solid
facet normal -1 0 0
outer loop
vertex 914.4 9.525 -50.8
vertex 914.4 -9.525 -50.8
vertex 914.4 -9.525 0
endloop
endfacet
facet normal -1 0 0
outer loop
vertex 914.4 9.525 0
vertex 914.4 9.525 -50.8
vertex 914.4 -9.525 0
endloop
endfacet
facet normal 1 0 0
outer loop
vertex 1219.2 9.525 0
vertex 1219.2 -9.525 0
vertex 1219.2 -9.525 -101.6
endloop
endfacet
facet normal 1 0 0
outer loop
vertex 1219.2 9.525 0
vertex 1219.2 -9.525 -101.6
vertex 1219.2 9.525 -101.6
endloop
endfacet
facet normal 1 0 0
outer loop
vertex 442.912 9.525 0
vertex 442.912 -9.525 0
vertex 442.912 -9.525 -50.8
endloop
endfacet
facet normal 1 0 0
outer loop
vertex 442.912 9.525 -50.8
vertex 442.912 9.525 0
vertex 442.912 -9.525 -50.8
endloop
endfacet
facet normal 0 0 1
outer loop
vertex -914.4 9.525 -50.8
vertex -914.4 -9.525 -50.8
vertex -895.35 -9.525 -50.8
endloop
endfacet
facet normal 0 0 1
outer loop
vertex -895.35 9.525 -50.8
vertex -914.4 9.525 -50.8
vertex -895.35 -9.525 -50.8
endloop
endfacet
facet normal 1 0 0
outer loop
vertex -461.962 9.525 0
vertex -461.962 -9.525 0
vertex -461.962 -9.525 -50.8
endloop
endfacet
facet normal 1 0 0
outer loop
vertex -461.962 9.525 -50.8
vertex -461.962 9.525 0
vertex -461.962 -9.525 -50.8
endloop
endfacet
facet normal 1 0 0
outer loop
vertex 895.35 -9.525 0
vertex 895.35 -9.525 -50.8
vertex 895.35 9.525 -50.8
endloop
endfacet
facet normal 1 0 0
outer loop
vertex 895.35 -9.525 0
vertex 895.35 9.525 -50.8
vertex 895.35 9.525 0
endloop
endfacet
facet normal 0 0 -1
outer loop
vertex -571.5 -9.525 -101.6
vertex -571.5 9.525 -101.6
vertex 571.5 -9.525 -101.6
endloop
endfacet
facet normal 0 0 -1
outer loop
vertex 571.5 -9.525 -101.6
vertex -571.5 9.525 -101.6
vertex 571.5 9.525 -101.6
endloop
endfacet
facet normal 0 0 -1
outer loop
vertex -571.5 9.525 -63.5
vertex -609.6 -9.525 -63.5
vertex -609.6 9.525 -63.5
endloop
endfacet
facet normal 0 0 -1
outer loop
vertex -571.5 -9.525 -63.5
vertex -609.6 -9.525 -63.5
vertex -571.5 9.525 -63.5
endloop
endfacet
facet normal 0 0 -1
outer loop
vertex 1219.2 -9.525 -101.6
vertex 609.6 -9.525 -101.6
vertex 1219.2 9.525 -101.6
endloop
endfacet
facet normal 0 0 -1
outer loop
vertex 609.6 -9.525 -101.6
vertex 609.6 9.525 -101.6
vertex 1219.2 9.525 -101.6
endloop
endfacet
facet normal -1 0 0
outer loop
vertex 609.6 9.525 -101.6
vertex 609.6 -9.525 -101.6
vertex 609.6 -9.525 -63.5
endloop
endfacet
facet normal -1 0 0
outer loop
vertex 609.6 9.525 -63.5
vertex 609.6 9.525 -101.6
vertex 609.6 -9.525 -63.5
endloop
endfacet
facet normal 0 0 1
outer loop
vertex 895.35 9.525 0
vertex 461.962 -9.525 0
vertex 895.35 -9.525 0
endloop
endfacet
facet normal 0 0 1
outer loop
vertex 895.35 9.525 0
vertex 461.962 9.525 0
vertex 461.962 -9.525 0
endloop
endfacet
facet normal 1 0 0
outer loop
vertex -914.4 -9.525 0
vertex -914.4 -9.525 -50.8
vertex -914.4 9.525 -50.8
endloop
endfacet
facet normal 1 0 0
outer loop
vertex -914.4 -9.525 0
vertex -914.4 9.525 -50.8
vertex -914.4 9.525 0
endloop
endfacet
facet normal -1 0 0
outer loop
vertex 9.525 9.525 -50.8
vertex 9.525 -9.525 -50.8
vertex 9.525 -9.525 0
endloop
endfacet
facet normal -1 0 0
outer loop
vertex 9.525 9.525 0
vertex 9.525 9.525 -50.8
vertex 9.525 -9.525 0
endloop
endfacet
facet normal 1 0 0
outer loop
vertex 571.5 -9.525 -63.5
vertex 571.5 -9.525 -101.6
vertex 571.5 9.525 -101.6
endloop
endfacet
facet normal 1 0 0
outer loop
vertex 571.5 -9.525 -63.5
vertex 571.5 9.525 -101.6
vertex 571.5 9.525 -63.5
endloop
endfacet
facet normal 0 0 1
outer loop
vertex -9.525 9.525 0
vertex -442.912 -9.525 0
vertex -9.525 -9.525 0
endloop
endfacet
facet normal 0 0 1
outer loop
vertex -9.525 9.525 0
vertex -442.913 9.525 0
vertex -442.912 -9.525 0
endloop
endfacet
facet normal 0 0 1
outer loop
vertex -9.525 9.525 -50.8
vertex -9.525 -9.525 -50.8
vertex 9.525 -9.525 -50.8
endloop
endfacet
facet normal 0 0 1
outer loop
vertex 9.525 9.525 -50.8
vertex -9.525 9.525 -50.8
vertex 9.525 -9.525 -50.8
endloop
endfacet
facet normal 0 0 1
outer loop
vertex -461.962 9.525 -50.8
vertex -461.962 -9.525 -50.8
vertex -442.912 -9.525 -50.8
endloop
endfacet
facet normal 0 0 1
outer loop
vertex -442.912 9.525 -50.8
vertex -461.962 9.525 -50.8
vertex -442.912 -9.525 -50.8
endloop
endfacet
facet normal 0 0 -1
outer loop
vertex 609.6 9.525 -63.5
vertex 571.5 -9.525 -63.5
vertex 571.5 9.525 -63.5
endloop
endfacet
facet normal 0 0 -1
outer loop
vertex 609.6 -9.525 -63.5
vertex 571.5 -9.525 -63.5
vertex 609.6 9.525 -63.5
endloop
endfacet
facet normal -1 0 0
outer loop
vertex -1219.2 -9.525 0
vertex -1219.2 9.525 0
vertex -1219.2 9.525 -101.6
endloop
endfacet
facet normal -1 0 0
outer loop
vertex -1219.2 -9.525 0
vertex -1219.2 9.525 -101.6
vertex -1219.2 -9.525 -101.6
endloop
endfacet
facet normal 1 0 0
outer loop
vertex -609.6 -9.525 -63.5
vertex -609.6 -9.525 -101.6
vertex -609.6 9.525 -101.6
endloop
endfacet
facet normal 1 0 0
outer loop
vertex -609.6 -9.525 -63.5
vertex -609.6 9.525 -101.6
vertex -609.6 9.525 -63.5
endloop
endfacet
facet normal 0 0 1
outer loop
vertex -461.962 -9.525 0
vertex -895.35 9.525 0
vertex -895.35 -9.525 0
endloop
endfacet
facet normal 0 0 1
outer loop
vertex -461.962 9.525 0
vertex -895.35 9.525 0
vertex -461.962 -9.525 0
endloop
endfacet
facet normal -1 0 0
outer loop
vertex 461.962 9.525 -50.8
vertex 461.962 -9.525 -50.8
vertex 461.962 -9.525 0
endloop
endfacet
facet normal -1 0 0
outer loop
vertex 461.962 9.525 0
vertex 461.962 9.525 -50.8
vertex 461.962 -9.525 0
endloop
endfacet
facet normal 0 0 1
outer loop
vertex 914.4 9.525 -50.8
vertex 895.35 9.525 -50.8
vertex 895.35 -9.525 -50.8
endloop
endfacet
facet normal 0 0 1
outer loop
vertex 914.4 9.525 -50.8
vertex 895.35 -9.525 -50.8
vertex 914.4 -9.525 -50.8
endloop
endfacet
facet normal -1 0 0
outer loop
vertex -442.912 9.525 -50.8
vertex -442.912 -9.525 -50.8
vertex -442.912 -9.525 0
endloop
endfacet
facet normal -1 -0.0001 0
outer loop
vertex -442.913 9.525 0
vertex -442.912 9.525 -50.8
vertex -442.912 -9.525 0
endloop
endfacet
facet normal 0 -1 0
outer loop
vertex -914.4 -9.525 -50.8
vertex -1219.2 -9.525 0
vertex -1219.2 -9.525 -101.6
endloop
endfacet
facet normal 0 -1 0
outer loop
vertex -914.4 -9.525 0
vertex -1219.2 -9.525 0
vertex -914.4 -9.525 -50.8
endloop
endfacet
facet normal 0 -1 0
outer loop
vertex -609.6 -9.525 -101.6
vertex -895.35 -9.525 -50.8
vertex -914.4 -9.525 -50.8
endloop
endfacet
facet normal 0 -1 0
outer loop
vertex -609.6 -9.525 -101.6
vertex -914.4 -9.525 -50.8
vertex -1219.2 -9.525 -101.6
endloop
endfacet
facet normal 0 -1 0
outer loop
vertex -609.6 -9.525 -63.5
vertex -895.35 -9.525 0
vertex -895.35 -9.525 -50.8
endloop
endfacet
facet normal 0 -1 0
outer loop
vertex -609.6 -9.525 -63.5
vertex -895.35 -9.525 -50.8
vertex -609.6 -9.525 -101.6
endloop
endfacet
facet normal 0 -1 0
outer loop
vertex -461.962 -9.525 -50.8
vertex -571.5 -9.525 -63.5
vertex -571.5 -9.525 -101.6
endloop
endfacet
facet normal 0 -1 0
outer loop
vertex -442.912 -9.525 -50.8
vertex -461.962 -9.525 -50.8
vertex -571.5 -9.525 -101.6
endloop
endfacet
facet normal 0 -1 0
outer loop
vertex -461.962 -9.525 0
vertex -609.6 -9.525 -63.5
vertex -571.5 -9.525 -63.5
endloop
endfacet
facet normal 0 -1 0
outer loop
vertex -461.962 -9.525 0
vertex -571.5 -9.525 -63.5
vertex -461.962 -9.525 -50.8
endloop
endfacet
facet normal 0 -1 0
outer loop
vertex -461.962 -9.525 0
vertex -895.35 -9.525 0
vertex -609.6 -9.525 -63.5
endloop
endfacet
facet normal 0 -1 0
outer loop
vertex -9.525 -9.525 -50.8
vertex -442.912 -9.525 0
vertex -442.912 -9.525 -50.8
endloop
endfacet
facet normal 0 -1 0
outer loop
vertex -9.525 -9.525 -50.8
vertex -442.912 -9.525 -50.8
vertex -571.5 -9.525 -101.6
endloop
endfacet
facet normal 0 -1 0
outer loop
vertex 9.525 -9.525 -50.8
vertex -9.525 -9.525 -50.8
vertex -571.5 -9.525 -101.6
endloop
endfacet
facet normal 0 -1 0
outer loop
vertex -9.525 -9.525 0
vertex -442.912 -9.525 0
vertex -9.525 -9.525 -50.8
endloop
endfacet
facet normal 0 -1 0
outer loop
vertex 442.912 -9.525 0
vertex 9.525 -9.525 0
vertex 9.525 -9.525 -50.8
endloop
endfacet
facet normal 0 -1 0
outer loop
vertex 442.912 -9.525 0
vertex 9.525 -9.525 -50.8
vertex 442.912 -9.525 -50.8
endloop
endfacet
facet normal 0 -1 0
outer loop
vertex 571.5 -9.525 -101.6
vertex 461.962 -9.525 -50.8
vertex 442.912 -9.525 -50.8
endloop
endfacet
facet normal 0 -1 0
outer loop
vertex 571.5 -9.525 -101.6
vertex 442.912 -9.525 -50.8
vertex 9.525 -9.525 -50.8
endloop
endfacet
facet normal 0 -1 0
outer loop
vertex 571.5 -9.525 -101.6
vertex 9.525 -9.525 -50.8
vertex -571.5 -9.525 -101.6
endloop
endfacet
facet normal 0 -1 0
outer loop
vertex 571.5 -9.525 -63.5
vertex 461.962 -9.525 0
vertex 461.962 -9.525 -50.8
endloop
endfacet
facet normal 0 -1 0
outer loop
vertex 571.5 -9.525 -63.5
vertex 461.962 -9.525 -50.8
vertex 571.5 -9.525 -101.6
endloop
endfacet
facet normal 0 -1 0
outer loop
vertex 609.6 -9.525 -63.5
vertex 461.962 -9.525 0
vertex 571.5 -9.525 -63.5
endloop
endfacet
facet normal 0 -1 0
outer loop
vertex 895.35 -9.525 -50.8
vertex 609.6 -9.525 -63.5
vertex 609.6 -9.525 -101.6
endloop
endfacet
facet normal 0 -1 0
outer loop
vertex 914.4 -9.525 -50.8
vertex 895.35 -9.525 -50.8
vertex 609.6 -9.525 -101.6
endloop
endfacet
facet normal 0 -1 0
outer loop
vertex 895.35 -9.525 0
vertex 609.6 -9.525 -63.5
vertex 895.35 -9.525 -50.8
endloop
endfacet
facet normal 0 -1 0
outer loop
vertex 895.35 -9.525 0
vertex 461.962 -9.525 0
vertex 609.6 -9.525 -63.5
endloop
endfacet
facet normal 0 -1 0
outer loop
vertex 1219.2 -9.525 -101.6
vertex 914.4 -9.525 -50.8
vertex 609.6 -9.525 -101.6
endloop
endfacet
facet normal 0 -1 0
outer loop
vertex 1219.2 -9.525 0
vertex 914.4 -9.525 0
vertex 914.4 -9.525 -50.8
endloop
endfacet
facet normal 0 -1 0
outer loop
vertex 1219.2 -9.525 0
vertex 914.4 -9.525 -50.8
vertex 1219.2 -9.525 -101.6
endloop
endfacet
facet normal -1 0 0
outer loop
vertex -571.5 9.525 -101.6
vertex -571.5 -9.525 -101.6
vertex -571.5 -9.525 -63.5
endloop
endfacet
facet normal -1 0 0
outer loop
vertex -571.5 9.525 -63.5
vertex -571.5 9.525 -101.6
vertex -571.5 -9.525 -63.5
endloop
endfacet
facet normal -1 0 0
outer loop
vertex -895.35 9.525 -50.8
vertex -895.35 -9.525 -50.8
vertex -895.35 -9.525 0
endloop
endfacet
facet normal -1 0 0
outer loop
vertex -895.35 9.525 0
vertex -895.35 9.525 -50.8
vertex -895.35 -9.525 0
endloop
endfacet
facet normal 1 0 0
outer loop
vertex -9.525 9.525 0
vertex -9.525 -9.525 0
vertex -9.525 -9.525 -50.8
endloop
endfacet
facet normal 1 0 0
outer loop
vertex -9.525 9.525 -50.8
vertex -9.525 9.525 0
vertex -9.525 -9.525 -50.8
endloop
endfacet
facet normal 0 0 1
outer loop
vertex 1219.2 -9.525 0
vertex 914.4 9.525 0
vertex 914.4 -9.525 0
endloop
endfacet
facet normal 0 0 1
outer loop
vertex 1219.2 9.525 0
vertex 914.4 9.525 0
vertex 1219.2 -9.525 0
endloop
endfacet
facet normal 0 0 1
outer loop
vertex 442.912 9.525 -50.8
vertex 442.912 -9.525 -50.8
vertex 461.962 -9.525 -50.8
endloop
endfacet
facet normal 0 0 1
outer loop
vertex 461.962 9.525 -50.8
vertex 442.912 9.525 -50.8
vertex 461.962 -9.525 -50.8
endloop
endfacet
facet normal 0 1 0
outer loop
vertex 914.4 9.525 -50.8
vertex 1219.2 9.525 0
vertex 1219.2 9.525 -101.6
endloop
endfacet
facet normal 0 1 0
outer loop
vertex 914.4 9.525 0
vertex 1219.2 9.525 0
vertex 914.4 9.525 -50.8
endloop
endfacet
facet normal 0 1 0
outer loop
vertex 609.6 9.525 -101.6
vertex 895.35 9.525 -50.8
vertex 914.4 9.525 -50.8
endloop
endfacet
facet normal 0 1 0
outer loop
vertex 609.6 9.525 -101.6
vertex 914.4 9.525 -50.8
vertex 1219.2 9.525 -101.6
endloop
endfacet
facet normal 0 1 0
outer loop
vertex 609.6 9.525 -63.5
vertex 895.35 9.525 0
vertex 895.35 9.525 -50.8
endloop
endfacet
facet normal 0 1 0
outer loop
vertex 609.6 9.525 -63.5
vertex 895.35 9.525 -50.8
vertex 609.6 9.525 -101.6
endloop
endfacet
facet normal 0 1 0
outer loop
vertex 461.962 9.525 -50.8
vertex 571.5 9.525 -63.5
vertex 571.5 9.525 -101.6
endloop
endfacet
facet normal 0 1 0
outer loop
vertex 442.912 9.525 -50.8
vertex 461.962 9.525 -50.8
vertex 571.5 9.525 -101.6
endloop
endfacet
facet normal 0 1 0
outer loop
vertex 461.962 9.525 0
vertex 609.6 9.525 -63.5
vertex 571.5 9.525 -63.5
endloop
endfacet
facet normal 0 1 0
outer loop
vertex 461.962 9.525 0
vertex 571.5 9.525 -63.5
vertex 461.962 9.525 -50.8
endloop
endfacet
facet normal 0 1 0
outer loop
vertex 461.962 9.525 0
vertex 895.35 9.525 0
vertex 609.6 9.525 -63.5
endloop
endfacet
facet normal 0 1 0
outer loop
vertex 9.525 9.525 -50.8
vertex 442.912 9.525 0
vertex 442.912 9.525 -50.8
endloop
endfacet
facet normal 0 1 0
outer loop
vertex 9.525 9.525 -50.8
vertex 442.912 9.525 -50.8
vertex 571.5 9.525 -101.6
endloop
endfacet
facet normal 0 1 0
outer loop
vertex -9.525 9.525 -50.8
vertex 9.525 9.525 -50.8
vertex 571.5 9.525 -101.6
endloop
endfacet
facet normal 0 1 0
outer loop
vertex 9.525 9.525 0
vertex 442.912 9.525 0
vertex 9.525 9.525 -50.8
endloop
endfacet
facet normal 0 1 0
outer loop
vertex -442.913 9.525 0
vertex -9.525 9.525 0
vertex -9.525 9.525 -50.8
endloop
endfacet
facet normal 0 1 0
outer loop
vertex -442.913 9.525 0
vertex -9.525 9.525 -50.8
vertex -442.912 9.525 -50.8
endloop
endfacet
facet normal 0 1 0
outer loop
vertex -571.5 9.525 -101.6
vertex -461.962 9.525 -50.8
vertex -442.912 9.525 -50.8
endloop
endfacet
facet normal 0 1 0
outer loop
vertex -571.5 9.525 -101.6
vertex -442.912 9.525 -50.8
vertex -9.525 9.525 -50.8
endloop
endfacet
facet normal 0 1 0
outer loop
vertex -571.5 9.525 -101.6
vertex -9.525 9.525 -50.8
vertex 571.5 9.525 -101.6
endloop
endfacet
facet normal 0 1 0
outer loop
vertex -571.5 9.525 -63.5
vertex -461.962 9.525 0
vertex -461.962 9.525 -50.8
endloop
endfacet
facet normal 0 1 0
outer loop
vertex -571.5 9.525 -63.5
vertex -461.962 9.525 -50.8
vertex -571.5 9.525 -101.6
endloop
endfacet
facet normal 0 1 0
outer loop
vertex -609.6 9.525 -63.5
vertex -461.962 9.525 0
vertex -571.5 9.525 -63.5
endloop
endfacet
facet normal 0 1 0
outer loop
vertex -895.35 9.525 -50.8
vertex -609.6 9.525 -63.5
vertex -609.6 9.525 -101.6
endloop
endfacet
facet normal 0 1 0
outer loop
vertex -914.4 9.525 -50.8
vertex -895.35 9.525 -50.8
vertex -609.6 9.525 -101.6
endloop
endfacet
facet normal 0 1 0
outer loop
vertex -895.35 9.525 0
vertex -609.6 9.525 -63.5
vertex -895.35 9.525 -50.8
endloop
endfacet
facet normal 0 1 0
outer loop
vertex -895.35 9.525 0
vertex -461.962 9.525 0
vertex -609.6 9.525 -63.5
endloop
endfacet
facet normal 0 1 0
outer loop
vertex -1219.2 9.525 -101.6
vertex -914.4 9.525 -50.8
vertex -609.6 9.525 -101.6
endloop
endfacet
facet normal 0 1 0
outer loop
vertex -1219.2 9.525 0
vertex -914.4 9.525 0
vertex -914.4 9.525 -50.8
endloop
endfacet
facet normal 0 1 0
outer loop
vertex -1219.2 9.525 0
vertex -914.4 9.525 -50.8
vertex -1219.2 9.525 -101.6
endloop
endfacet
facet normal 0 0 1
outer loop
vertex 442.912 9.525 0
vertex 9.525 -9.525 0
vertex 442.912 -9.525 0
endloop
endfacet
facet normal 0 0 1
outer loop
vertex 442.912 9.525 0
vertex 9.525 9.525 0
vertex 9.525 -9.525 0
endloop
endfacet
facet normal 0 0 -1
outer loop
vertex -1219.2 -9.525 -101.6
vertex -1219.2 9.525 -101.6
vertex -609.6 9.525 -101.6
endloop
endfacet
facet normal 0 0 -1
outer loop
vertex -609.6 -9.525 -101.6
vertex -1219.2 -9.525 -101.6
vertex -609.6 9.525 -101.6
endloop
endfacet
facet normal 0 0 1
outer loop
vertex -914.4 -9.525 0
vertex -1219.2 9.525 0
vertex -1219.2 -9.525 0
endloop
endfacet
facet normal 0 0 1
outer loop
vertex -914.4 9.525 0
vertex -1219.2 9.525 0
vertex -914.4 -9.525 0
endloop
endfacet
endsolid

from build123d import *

# Parameters (mm, degrees)
F1_DEPTH = 101.6
F2_W     = 38.1
F2_H     = 38.1
F3_DEPTH = 25.4
F4_DEPTH = 25.4
F2_W_2   = 19.05
F2_H_2   = 50.8
F5_DEPTH = 25.4


with BuildPart() as f1:
    # F0 (on Top) → F1 (new body)
    with BuildSketch(Plane.XY):
        Polygon((1219.2, -9.525), (1219.2, 0), (1219.2, 9.525), (-1219.2, 9.525), (-1219.2, 0), (-1219.2, -9.525), align=None)
    extrude(amount=-F1_DEPTH)

    # F2 (on face) → F3 (cut)
    with BuildSketch(Plane.XZ.offset(9.525)):
        with Locations((590.55, -82.55)):
            Rectangle(F2_W, F2_H)
    extrude(amount=-F3_DEPTH, mode=Mode.SUBTRACT)

    # F2 (on face) → F4 (cut)
    with BuildSketch(Plane.XZ.offset(9.525)):
        with Locations((-590.55, -82.55)):
            Rectangle(F2_W, F2_H)
    extrude(amount=-F4_DEPTH, mode=Mode.SUBTRACT)

    # F2 (on face) → F5 (cut)
    with BuildSketch(Plane.XZ.offset(9.525)):
        with Locations((-904.875, -25.4)):
            Rectangle(F2_W_2, F2_H_2)
        Polygon((-452.4375, 0), (-461.9625, 0), (-461.9625, -50.8), (-442.9125, -50.8), (-442.9125, 0), align=None)
        Polygon((9.525, -50.8), (9.525, 0), (0, 0), (-9.525, 0), (-9.525, -50.8), (0, -50.8), align=None)
        Polygon((461.9625, -50.8), (461.9625, 0), (452.4375, 0), (442.9125, 0), (442.9125, -50.8), align=None)
        with Locations((904.875, -25.4)):
            Rectangle(F2_W_2, F2_H_2)
    extrude(amount=-F5_DEPTH, mode=Mode.SUBTRACT)


solid = f1.part
